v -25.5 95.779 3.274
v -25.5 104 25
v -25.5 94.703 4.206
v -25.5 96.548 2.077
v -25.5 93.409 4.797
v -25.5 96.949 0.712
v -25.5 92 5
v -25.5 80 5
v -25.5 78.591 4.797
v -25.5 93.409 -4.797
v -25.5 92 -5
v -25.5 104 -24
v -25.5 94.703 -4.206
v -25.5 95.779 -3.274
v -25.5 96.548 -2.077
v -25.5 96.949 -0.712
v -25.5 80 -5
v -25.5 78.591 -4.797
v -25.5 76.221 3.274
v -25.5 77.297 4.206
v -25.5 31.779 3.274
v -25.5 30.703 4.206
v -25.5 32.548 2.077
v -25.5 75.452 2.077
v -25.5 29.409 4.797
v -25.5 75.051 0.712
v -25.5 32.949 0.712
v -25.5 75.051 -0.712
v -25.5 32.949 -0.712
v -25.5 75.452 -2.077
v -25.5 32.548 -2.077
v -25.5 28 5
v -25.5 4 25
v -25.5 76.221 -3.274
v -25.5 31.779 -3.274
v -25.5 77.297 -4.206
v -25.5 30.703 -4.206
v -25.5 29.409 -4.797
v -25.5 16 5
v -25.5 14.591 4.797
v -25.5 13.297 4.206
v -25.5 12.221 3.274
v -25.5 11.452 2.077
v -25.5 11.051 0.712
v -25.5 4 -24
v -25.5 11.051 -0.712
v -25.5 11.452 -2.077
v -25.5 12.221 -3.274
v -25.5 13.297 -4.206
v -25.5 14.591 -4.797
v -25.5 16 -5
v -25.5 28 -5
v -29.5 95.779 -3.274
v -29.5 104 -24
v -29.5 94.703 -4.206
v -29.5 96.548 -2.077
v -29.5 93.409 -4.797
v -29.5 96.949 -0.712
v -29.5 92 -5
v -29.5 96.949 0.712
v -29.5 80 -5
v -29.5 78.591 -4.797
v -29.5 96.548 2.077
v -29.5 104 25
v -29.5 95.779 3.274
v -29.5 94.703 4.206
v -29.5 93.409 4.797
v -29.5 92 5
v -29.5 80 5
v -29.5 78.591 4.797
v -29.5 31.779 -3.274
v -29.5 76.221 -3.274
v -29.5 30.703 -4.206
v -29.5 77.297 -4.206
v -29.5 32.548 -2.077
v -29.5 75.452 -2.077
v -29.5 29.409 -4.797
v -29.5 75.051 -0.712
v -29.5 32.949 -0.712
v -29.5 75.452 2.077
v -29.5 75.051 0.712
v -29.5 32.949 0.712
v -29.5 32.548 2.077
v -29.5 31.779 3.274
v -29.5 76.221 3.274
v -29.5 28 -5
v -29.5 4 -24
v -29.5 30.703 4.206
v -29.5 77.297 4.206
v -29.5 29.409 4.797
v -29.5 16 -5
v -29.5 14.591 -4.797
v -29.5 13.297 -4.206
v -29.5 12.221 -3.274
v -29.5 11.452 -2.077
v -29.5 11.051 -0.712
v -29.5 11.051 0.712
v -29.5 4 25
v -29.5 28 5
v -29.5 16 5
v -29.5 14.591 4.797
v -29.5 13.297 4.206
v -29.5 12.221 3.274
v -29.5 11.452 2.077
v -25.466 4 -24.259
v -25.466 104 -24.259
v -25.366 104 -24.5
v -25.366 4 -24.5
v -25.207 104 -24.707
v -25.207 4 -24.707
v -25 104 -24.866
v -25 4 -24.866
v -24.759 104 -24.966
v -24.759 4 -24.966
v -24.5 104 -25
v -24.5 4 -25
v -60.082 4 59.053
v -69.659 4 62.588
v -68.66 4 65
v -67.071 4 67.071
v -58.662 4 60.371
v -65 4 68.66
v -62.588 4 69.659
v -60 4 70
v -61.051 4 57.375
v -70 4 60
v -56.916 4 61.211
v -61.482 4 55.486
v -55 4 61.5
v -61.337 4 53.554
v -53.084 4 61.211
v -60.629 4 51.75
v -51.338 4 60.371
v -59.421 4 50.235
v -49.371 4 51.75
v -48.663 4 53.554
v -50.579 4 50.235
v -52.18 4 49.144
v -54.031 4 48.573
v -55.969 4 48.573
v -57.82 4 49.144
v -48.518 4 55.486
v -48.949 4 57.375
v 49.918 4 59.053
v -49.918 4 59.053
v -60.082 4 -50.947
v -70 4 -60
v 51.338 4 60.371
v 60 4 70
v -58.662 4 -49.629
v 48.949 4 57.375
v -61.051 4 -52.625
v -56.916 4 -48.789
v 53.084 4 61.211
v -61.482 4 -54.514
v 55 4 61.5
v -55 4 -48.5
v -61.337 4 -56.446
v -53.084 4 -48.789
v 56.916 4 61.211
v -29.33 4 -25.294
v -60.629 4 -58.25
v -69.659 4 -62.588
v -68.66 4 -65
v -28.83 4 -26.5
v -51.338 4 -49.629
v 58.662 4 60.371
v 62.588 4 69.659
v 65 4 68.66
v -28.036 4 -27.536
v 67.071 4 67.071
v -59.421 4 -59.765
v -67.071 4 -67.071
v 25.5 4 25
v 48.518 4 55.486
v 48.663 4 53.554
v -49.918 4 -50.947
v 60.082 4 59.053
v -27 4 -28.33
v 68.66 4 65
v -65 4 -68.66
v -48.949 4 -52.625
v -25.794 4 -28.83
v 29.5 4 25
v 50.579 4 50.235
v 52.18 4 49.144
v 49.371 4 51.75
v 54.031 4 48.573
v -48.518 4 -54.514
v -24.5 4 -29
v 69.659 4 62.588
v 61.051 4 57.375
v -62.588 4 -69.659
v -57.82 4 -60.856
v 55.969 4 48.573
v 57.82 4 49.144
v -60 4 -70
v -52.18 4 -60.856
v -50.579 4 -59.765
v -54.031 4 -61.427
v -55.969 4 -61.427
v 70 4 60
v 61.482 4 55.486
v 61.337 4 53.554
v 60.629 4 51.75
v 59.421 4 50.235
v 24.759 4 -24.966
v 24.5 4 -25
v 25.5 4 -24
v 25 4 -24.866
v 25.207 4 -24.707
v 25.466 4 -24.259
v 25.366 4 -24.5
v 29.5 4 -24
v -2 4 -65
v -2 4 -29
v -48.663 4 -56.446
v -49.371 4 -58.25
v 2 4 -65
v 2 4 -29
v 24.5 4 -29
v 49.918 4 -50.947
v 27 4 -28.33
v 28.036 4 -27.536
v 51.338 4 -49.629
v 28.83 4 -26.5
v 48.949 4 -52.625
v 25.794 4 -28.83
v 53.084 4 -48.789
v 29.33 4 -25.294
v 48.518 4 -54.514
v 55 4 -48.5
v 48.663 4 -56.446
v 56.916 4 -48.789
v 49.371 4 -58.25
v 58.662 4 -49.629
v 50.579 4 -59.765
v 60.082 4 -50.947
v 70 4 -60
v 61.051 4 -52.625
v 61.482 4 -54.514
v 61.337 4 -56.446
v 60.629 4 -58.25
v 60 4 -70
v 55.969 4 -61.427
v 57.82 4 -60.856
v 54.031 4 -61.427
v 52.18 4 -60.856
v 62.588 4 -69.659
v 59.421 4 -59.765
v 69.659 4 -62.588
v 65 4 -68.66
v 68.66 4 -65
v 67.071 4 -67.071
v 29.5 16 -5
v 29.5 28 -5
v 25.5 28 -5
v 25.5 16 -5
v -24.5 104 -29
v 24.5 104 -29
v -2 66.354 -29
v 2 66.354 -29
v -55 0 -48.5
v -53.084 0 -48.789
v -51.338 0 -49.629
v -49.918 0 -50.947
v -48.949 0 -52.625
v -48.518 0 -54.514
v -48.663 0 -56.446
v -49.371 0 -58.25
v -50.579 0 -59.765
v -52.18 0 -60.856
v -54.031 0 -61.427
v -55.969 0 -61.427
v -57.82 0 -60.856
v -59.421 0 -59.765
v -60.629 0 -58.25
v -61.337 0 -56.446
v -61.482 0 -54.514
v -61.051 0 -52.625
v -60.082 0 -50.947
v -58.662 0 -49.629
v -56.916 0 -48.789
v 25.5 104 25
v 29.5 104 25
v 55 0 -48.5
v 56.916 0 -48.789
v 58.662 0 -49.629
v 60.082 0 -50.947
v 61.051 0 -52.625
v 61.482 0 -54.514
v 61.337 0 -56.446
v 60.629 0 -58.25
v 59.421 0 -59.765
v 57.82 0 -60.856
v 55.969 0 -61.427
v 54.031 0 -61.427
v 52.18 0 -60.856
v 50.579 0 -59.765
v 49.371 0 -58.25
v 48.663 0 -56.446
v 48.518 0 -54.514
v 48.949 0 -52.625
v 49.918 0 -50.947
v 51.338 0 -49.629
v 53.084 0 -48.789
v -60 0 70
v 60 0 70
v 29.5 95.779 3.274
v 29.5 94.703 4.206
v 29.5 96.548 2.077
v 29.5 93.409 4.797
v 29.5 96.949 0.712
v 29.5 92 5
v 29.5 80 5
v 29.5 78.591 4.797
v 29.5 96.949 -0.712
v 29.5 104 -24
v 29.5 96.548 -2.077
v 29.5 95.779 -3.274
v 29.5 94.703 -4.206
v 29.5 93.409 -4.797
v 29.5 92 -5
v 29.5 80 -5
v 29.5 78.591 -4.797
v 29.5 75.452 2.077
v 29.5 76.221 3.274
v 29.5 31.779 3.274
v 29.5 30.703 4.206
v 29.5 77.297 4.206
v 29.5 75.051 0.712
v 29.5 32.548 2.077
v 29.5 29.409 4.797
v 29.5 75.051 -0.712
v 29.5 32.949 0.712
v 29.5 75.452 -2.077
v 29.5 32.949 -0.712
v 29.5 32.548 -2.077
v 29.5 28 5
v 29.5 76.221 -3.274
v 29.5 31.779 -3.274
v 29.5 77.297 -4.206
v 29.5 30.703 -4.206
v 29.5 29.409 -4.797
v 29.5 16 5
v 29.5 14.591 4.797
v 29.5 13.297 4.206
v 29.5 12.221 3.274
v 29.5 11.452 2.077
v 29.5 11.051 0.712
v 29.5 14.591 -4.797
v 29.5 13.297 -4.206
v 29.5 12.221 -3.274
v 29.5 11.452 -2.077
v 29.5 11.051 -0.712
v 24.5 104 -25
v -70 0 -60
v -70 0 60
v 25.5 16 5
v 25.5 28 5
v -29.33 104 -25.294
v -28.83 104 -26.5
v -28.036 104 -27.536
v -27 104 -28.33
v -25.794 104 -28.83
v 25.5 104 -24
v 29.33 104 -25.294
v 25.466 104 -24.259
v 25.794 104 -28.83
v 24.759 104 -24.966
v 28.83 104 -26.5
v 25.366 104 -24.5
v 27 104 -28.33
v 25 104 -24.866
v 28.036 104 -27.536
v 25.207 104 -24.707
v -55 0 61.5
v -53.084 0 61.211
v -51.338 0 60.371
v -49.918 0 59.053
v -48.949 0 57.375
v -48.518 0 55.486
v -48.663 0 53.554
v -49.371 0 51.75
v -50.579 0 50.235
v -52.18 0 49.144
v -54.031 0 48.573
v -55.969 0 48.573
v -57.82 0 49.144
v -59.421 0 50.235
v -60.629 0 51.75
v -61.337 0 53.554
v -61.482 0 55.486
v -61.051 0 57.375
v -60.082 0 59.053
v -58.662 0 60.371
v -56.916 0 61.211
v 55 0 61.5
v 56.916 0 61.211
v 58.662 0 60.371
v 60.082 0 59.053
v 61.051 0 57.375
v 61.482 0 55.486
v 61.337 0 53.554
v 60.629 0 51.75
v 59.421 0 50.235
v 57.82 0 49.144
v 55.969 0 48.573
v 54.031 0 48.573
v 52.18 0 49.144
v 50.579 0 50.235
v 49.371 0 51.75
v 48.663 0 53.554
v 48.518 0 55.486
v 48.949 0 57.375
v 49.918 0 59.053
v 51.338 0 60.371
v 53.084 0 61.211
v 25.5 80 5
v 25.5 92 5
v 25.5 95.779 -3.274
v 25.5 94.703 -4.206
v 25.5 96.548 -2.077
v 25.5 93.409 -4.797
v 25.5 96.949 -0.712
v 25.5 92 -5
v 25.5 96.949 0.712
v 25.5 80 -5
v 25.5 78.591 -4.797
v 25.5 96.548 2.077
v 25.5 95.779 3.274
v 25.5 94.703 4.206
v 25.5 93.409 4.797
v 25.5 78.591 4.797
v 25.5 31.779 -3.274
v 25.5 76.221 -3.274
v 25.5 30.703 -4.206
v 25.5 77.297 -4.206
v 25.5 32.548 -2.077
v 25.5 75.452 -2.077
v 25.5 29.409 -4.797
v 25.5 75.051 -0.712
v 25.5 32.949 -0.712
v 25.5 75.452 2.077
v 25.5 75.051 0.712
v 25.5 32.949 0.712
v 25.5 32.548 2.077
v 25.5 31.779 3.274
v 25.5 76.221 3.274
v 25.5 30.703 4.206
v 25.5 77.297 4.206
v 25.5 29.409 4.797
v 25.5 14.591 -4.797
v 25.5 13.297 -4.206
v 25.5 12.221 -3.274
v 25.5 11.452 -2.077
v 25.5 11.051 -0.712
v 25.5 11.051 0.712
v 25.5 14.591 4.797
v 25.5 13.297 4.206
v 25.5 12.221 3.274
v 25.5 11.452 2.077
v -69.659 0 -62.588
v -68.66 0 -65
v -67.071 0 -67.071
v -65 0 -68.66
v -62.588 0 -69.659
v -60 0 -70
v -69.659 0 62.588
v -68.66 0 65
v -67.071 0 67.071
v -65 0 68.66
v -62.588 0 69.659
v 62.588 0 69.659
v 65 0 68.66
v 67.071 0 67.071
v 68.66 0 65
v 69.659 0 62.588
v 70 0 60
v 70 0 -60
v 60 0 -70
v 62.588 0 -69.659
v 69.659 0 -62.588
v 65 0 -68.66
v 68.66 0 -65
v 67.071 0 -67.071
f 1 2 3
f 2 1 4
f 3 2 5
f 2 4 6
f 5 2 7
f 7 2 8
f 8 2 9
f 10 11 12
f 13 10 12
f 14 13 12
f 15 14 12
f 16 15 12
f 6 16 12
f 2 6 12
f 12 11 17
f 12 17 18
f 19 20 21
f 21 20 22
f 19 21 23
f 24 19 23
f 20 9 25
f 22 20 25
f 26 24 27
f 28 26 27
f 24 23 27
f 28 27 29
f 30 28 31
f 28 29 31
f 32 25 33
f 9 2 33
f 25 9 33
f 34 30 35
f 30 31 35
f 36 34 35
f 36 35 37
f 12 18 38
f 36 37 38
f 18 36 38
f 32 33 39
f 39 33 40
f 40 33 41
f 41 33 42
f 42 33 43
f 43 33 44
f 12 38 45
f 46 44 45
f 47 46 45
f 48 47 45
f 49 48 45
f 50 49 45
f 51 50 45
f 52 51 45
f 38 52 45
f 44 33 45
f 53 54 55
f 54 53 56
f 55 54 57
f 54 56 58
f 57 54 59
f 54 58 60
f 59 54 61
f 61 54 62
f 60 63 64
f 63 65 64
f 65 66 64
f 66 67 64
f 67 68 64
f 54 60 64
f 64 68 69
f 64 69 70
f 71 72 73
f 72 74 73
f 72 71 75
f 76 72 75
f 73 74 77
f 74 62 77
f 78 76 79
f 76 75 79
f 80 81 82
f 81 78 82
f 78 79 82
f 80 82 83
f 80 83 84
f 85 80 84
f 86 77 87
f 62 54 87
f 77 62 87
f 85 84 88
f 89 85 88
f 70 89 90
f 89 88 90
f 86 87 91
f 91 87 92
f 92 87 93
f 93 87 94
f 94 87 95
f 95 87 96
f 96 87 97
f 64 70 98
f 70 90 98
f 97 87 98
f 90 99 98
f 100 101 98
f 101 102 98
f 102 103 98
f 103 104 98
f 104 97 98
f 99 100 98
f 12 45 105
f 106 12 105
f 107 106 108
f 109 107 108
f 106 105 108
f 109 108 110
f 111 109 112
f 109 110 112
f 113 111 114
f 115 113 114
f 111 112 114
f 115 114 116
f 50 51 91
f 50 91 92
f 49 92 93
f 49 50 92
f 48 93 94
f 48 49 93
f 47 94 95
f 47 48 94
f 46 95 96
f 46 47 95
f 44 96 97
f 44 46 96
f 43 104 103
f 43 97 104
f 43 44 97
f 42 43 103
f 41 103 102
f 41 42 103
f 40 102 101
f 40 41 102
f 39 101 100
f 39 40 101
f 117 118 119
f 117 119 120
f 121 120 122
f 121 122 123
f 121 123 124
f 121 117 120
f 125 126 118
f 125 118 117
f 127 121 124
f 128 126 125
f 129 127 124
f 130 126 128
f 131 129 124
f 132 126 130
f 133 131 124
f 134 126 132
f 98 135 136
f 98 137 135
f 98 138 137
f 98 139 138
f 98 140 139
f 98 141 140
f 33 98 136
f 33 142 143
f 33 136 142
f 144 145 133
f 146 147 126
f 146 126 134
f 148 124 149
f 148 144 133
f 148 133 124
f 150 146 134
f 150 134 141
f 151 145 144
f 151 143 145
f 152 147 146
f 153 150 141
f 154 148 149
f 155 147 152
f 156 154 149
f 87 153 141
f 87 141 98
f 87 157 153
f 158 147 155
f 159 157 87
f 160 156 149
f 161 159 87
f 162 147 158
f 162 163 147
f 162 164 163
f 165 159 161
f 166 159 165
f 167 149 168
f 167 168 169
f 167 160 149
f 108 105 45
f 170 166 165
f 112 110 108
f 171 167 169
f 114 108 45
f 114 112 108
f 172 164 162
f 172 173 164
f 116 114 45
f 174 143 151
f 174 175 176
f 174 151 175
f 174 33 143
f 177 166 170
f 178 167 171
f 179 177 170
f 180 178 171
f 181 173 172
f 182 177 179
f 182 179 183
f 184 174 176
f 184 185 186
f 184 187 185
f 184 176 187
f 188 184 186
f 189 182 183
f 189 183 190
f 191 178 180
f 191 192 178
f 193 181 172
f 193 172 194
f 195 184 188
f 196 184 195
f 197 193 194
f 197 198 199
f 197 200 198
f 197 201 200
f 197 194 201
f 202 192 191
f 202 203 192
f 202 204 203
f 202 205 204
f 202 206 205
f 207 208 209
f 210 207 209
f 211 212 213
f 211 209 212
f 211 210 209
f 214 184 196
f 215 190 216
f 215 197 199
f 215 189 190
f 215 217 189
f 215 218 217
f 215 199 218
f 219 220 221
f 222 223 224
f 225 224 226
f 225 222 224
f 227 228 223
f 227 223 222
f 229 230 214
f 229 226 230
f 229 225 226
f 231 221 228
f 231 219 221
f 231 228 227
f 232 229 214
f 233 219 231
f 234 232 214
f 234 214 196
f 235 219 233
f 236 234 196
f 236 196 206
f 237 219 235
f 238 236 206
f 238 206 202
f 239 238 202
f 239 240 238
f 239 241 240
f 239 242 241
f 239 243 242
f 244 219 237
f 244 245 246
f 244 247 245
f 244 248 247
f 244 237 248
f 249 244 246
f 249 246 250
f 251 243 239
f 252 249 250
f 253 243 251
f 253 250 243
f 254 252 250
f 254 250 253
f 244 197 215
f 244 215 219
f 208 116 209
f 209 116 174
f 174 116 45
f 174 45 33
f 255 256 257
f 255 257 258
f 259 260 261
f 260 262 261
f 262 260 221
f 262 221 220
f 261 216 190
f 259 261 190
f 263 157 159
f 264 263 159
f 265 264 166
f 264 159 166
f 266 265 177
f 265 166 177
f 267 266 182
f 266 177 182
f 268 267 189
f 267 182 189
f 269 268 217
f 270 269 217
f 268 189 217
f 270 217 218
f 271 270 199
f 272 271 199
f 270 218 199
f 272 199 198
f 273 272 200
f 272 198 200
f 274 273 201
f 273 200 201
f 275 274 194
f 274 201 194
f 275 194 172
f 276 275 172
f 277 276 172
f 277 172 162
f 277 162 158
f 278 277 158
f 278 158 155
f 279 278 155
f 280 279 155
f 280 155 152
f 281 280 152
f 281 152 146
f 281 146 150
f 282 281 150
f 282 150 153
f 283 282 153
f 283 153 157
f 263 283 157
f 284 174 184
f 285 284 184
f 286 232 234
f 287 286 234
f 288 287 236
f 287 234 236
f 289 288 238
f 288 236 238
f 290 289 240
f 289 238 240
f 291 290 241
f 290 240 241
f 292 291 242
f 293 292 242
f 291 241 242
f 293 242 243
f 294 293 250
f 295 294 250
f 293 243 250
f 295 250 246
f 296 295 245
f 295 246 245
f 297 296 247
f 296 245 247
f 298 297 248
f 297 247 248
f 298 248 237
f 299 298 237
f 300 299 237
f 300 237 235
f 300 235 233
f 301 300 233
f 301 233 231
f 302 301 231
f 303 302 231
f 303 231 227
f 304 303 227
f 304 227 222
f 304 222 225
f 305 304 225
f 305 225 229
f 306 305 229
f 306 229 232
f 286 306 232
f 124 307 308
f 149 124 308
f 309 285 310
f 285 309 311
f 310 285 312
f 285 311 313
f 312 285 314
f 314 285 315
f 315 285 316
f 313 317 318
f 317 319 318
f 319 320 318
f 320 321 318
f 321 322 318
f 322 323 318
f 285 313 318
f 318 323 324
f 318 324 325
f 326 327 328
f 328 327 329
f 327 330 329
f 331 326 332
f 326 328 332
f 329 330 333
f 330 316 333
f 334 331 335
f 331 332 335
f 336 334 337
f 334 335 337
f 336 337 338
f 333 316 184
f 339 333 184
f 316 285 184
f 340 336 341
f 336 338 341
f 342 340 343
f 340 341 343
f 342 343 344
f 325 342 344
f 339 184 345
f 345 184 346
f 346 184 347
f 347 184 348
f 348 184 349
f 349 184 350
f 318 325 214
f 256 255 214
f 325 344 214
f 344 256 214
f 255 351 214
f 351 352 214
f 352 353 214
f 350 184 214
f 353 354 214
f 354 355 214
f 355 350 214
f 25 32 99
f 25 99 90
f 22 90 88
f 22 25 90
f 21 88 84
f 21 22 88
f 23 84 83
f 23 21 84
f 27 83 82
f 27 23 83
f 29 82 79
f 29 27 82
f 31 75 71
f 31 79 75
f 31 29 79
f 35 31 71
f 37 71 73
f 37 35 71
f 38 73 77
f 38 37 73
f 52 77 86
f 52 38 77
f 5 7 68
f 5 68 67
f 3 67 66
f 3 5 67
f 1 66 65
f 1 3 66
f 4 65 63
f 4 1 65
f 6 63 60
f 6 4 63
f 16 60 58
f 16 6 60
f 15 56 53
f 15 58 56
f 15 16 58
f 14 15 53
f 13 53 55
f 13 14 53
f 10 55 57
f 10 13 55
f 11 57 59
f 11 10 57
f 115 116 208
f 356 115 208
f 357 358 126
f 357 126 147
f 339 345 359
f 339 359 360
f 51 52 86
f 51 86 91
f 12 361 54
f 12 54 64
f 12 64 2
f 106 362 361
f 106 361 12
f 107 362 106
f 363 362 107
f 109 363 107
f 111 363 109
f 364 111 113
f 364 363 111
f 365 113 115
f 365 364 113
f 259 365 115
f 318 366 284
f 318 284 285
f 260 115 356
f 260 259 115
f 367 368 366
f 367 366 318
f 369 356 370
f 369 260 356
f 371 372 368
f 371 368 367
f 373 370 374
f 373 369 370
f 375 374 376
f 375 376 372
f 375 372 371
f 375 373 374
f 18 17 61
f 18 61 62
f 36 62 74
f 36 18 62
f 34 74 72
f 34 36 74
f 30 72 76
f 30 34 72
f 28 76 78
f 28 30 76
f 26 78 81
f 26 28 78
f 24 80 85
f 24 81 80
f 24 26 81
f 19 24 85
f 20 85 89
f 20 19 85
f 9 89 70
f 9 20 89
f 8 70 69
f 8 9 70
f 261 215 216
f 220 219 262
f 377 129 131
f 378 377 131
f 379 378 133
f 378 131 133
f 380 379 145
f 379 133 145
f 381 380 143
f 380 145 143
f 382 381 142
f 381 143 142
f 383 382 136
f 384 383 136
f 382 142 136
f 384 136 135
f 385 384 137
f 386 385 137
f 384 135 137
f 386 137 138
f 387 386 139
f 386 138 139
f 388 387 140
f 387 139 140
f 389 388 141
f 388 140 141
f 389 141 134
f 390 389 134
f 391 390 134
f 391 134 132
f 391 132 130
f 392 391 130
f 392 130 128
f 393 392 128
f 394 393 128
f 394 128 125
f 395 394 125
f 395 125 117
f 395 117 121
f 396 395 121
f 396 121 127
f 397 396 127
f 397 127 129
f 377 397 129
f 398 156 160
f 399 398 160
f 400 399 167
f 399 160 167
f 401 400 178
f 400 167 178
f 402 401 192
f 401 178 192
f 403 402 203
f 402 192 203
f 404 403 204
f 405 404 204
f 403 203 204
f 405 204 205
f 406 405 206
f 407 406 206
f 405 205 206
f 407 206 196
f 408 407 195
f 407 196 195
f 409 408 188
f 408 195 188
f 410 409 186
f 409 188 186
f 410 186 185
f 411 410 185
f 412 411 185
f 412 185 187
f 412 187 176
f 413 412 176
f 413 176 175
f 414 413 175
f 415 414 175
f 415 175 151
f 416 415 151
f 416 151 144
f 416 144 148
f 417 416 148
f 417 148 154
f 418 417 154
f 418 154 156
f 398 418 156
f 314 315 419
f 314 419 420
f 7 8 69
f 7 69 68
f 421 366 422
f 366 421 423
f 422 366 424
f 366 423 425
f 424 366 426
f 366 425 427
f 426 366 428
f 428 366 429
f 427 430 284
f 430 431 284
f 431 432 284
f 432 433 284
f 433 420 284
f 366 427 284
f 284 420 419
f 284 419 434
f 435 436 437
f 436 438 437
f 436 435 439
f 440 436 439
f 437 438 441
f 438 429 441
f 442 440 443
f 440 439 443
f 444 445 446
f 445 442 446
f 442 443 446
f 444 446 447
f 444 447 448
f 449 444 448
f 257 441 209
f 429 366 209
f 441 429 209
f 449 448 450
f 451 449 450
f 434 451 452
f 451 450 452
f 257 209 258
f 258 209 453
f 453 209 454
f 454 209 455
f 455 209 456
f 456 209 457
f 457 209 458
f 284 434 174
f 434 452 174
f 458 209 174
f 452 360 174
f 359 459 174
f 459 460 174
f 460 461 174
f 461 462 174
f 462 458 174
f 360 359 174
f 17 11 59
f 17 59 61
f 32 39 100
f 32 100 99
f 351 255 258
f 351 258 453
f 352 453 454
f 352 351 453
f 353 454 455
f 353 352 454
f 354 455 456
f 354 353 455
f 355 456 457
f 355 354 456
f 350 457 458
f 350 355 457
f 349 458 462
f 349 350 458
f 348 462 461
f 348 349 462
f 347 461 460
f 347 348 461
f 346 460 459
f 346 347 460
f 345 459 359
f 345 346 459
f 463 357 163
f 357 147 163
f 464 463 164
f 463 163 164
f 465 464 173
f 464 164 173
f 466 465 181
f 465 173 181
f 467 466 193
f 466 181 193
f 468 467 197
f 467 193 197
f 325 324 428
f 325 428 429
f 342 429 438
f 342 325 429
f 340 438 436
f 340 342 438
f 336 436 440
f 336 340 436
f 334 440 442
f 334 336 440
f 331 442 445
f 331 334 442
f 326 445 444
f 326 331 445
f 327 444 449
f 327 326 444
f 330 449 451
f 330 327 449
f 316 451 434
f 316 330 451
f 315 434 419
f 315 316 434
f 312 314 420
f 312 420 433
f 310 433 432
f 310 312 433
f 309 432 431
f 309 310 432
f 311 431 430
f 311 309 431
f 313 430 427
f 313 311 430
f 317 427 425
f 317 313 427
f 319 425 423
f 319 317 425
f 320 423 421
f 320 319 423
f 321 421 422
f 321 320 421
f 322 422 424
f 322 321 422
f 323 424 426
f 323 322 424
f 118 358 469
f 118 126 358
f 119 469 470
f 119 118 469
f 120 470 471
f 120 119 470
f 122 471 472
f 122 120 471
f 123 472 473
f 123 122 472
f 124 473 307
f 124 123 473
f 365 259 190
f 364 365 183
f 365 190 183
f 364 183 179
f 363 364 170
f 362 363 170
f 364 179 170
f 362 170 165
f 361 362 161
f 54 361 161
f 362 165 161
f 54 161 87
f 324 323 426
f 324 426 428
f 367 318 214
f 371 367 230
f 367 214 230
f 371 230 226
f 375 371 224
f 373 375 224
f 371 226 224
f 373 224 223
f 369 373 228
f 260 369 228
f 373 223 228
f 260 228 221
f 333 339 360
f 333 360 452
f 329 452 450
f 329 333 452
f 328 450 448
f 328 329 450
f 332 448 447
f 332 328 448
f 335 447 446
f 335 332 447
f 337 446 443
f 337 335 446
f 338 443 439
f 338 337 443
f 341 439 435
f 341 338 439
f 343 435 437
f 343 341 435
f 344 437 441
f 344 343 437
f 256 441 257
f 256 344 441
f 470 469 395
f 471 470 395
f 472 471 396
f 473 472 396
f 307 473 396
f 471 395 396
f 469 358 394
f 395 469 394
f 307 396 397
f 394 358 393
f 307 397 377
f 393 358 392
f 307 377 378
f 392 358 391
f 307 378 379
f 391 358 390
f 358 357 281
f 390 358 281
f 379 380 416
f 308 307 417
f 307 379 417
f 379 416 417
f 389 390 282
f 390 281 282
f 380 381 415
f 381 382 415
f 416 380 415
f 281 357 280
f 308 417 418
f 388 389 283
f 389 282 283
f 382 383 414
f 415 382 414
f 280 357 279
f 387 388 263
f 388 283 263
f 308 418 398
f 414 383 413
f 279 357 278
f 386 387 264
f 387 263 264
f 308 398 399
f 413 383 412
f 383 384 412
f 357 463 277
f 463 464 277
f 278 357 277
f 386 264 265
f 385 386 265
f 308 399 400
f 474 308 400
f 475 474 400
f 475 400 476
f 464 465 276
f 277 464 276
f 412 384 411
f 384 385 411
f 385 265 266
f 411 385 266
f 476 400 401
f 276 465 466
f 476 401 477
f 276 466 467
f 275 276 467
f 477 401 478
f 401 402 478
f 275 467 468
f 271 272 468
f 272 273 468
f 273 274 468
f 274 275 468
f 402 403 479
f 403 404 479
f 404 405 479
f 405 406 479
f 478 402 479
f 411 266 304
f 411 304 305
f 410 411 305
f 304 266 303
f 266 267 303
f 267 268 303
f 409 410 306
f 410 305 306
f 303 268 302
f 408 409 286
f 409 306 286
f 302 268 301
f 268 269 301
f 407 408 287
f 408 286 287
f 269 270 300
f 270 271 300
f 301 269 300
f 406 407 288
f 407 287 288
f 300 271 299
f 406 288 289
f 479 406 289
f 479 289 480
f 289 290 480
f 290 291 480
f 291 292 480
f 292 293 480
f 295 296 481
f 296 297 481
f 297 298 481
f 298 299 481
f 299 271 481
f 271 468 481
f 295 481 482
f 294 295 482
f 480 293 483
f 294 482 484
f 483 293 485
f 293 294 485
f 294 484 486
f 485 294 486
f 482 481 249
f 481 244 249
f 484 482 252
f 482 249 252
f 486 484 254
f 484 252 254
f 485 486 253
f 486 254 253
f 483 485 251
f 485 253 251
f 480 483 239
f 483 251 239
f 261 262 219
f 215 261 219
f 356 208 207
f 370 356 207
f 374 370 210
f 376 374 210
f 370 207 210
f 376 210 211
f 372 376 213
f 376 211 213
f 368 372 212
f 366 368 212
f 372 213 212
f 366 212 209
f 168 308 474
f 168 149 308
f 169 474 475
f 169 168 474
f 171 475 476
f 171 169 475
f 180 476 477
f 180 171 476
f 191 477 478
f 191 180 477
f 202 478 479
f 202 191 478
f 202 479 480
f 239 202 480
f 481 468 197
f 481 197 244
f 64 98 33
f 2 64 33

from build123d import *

# Parameters (mm, degrees)
SKETCH_2_W          = 140
SKETCH_2_H          = 140
EXTRUDE_1_DEPTH     = 4
EXTRUDE_1_2_DEPTH   = 100
EXTRUDE_2_DEPTH     = 2
CUT_EXTRUDE_1_DEPTH = 100.5
SKETCH_6_R          = 6.5
CUT_EXTRUDE_2_DEPTH = 5
FILLET_1_R          = 10


with BuildPart() as part:
    # Эскиз2 → Extrude 1 (new body)
    with BuildSketch(Plane(origin=(0, 0, 0), x_dir=(1, 0, 0), z_dir=(0, 1, 0))):
        Rectangle(SKETCH_2_W, SKETCH_2_H)
    extrude(amount=EXTRUDE_1_DEPTH)

    # Эскиз3 → Extrude 1 2 (add)
    with BuildSketch(Plane(origin=(0, 4, 0), x_dir=(1, 0, 0), z_dir=(0, 1, 0))):
        with BuildLine():
            Line((-25.5, -25), (-25.5, 24))
            ThreePointArc((-25.5, 24), (-25.207106781, 24.707106781), (-24.5, 25))
            Line((-24.5, 25), (24.5, 25))
            ThreePointArc((24.5, 25), (25.207106781, 24.707106781), (25.5, 24))
            Line((25.5, 24), (25.5, -25))
            Line((25.5, -25), (29.5, -25))
            Line((29.5, -25), (29.5, 24))
            ThreePointArc((29.5, 24), (28.035533906, 27.535533906), (24.5, 29))
            Line((24.5, 29), (-24.5, 29))
            ThreePointArc((-24.5, 29), (-28.035533906, 27.535533906), (-29.5, 24))
            Line((-29.5, 24), (-29.5, -25))
            Line((-29.5, -25), (-25.5, -25))
        make_face()
    extrude(amount=EXTRUDE_1_2_DEPTH)

    # Эскиз4 → Бобышка-Вытянуть2 (add, symmetric)
    with BuildSketch(Plane(origin=(0, 0, 0), x_dir=(0, 0, -1), z_dir=(1, 0, 0))):
        Polygon((29, 66.353829072), (65, 4), (29, 4), align=None)
    extrude(amount=EXTRUDE_2_DEPTH, both=True)

    # Эскиз5 → Вырез-Вытянуть1 (cut, through all)
    with BuildSketch(Plane(origin=(29.5, 0, 0), x_dir=(0, 0, -1), z_dir=(1, 0, 0))):
        with BuildLine():
            Line((5, 92), (5, 80))
            ThreePointArc((5, 80), (0, 75), (-5, 80))
            Line((-5, 80), (-5, 92))
            ThreePointArc((-5, 92), (0, 97), (5, 92))
        make_face()
        with BuildLine():
            Line((5, 28), (5, 16))
            ThreePointArc((5, 16), (0, 11), (-5, 16))
            Line((-5, 16), (-5, 28))
            ThreePointArc((-5, 28), (0, 33), (5, 28))
        make_face()
    extrude(amount=-CUT_EXTRUDE_1_DEPTH, mode=Mode.SUBTRACT)

    # Эскиз6 → Вырез-Вытянуть2 (cut, through all)
    with BuildSketch(Plane(origin=(0, 4, 0), x_dir=(1, 0, 0), z_dir=(0, 1, 0))):
        with Locations(Location((-55, 55, 0), (0, 0, 270))):  # turned: the seam where the file's is
            Circle(SKETCH_6_R)
        with Locations(Location((-55, -55, 0), (0, 0, 270))):  # turned: the seam where the file's is
            Circle(SKETCH_6_R)
        with Locations(Location((55, 55, 0), (0, 0, 270))):  # turned: the seam where the file's is
            Circle(SKETCH_6_R)
        with Locations(Location((55, -55, 0), (0, 0, 270))):  # turned: the seam where the file's is
            Circle(SKETCH_6_R)
    extrude(amount=-CUT_EXTRUDE_2_DEPTH, mode=Mode.SUBTRACT)

    # Скругление1
    fillet_1_edges = [part.edges().sort_by_distance(p)[0] for p in [
        (70, 2, 70),
        (-70, 2, 70),
        (-70, 2, -70),
        (70, 2, -70),
    ]]
    fillet(fillet_1_edges, radius=FILLET_1_R)


solid = part.part
